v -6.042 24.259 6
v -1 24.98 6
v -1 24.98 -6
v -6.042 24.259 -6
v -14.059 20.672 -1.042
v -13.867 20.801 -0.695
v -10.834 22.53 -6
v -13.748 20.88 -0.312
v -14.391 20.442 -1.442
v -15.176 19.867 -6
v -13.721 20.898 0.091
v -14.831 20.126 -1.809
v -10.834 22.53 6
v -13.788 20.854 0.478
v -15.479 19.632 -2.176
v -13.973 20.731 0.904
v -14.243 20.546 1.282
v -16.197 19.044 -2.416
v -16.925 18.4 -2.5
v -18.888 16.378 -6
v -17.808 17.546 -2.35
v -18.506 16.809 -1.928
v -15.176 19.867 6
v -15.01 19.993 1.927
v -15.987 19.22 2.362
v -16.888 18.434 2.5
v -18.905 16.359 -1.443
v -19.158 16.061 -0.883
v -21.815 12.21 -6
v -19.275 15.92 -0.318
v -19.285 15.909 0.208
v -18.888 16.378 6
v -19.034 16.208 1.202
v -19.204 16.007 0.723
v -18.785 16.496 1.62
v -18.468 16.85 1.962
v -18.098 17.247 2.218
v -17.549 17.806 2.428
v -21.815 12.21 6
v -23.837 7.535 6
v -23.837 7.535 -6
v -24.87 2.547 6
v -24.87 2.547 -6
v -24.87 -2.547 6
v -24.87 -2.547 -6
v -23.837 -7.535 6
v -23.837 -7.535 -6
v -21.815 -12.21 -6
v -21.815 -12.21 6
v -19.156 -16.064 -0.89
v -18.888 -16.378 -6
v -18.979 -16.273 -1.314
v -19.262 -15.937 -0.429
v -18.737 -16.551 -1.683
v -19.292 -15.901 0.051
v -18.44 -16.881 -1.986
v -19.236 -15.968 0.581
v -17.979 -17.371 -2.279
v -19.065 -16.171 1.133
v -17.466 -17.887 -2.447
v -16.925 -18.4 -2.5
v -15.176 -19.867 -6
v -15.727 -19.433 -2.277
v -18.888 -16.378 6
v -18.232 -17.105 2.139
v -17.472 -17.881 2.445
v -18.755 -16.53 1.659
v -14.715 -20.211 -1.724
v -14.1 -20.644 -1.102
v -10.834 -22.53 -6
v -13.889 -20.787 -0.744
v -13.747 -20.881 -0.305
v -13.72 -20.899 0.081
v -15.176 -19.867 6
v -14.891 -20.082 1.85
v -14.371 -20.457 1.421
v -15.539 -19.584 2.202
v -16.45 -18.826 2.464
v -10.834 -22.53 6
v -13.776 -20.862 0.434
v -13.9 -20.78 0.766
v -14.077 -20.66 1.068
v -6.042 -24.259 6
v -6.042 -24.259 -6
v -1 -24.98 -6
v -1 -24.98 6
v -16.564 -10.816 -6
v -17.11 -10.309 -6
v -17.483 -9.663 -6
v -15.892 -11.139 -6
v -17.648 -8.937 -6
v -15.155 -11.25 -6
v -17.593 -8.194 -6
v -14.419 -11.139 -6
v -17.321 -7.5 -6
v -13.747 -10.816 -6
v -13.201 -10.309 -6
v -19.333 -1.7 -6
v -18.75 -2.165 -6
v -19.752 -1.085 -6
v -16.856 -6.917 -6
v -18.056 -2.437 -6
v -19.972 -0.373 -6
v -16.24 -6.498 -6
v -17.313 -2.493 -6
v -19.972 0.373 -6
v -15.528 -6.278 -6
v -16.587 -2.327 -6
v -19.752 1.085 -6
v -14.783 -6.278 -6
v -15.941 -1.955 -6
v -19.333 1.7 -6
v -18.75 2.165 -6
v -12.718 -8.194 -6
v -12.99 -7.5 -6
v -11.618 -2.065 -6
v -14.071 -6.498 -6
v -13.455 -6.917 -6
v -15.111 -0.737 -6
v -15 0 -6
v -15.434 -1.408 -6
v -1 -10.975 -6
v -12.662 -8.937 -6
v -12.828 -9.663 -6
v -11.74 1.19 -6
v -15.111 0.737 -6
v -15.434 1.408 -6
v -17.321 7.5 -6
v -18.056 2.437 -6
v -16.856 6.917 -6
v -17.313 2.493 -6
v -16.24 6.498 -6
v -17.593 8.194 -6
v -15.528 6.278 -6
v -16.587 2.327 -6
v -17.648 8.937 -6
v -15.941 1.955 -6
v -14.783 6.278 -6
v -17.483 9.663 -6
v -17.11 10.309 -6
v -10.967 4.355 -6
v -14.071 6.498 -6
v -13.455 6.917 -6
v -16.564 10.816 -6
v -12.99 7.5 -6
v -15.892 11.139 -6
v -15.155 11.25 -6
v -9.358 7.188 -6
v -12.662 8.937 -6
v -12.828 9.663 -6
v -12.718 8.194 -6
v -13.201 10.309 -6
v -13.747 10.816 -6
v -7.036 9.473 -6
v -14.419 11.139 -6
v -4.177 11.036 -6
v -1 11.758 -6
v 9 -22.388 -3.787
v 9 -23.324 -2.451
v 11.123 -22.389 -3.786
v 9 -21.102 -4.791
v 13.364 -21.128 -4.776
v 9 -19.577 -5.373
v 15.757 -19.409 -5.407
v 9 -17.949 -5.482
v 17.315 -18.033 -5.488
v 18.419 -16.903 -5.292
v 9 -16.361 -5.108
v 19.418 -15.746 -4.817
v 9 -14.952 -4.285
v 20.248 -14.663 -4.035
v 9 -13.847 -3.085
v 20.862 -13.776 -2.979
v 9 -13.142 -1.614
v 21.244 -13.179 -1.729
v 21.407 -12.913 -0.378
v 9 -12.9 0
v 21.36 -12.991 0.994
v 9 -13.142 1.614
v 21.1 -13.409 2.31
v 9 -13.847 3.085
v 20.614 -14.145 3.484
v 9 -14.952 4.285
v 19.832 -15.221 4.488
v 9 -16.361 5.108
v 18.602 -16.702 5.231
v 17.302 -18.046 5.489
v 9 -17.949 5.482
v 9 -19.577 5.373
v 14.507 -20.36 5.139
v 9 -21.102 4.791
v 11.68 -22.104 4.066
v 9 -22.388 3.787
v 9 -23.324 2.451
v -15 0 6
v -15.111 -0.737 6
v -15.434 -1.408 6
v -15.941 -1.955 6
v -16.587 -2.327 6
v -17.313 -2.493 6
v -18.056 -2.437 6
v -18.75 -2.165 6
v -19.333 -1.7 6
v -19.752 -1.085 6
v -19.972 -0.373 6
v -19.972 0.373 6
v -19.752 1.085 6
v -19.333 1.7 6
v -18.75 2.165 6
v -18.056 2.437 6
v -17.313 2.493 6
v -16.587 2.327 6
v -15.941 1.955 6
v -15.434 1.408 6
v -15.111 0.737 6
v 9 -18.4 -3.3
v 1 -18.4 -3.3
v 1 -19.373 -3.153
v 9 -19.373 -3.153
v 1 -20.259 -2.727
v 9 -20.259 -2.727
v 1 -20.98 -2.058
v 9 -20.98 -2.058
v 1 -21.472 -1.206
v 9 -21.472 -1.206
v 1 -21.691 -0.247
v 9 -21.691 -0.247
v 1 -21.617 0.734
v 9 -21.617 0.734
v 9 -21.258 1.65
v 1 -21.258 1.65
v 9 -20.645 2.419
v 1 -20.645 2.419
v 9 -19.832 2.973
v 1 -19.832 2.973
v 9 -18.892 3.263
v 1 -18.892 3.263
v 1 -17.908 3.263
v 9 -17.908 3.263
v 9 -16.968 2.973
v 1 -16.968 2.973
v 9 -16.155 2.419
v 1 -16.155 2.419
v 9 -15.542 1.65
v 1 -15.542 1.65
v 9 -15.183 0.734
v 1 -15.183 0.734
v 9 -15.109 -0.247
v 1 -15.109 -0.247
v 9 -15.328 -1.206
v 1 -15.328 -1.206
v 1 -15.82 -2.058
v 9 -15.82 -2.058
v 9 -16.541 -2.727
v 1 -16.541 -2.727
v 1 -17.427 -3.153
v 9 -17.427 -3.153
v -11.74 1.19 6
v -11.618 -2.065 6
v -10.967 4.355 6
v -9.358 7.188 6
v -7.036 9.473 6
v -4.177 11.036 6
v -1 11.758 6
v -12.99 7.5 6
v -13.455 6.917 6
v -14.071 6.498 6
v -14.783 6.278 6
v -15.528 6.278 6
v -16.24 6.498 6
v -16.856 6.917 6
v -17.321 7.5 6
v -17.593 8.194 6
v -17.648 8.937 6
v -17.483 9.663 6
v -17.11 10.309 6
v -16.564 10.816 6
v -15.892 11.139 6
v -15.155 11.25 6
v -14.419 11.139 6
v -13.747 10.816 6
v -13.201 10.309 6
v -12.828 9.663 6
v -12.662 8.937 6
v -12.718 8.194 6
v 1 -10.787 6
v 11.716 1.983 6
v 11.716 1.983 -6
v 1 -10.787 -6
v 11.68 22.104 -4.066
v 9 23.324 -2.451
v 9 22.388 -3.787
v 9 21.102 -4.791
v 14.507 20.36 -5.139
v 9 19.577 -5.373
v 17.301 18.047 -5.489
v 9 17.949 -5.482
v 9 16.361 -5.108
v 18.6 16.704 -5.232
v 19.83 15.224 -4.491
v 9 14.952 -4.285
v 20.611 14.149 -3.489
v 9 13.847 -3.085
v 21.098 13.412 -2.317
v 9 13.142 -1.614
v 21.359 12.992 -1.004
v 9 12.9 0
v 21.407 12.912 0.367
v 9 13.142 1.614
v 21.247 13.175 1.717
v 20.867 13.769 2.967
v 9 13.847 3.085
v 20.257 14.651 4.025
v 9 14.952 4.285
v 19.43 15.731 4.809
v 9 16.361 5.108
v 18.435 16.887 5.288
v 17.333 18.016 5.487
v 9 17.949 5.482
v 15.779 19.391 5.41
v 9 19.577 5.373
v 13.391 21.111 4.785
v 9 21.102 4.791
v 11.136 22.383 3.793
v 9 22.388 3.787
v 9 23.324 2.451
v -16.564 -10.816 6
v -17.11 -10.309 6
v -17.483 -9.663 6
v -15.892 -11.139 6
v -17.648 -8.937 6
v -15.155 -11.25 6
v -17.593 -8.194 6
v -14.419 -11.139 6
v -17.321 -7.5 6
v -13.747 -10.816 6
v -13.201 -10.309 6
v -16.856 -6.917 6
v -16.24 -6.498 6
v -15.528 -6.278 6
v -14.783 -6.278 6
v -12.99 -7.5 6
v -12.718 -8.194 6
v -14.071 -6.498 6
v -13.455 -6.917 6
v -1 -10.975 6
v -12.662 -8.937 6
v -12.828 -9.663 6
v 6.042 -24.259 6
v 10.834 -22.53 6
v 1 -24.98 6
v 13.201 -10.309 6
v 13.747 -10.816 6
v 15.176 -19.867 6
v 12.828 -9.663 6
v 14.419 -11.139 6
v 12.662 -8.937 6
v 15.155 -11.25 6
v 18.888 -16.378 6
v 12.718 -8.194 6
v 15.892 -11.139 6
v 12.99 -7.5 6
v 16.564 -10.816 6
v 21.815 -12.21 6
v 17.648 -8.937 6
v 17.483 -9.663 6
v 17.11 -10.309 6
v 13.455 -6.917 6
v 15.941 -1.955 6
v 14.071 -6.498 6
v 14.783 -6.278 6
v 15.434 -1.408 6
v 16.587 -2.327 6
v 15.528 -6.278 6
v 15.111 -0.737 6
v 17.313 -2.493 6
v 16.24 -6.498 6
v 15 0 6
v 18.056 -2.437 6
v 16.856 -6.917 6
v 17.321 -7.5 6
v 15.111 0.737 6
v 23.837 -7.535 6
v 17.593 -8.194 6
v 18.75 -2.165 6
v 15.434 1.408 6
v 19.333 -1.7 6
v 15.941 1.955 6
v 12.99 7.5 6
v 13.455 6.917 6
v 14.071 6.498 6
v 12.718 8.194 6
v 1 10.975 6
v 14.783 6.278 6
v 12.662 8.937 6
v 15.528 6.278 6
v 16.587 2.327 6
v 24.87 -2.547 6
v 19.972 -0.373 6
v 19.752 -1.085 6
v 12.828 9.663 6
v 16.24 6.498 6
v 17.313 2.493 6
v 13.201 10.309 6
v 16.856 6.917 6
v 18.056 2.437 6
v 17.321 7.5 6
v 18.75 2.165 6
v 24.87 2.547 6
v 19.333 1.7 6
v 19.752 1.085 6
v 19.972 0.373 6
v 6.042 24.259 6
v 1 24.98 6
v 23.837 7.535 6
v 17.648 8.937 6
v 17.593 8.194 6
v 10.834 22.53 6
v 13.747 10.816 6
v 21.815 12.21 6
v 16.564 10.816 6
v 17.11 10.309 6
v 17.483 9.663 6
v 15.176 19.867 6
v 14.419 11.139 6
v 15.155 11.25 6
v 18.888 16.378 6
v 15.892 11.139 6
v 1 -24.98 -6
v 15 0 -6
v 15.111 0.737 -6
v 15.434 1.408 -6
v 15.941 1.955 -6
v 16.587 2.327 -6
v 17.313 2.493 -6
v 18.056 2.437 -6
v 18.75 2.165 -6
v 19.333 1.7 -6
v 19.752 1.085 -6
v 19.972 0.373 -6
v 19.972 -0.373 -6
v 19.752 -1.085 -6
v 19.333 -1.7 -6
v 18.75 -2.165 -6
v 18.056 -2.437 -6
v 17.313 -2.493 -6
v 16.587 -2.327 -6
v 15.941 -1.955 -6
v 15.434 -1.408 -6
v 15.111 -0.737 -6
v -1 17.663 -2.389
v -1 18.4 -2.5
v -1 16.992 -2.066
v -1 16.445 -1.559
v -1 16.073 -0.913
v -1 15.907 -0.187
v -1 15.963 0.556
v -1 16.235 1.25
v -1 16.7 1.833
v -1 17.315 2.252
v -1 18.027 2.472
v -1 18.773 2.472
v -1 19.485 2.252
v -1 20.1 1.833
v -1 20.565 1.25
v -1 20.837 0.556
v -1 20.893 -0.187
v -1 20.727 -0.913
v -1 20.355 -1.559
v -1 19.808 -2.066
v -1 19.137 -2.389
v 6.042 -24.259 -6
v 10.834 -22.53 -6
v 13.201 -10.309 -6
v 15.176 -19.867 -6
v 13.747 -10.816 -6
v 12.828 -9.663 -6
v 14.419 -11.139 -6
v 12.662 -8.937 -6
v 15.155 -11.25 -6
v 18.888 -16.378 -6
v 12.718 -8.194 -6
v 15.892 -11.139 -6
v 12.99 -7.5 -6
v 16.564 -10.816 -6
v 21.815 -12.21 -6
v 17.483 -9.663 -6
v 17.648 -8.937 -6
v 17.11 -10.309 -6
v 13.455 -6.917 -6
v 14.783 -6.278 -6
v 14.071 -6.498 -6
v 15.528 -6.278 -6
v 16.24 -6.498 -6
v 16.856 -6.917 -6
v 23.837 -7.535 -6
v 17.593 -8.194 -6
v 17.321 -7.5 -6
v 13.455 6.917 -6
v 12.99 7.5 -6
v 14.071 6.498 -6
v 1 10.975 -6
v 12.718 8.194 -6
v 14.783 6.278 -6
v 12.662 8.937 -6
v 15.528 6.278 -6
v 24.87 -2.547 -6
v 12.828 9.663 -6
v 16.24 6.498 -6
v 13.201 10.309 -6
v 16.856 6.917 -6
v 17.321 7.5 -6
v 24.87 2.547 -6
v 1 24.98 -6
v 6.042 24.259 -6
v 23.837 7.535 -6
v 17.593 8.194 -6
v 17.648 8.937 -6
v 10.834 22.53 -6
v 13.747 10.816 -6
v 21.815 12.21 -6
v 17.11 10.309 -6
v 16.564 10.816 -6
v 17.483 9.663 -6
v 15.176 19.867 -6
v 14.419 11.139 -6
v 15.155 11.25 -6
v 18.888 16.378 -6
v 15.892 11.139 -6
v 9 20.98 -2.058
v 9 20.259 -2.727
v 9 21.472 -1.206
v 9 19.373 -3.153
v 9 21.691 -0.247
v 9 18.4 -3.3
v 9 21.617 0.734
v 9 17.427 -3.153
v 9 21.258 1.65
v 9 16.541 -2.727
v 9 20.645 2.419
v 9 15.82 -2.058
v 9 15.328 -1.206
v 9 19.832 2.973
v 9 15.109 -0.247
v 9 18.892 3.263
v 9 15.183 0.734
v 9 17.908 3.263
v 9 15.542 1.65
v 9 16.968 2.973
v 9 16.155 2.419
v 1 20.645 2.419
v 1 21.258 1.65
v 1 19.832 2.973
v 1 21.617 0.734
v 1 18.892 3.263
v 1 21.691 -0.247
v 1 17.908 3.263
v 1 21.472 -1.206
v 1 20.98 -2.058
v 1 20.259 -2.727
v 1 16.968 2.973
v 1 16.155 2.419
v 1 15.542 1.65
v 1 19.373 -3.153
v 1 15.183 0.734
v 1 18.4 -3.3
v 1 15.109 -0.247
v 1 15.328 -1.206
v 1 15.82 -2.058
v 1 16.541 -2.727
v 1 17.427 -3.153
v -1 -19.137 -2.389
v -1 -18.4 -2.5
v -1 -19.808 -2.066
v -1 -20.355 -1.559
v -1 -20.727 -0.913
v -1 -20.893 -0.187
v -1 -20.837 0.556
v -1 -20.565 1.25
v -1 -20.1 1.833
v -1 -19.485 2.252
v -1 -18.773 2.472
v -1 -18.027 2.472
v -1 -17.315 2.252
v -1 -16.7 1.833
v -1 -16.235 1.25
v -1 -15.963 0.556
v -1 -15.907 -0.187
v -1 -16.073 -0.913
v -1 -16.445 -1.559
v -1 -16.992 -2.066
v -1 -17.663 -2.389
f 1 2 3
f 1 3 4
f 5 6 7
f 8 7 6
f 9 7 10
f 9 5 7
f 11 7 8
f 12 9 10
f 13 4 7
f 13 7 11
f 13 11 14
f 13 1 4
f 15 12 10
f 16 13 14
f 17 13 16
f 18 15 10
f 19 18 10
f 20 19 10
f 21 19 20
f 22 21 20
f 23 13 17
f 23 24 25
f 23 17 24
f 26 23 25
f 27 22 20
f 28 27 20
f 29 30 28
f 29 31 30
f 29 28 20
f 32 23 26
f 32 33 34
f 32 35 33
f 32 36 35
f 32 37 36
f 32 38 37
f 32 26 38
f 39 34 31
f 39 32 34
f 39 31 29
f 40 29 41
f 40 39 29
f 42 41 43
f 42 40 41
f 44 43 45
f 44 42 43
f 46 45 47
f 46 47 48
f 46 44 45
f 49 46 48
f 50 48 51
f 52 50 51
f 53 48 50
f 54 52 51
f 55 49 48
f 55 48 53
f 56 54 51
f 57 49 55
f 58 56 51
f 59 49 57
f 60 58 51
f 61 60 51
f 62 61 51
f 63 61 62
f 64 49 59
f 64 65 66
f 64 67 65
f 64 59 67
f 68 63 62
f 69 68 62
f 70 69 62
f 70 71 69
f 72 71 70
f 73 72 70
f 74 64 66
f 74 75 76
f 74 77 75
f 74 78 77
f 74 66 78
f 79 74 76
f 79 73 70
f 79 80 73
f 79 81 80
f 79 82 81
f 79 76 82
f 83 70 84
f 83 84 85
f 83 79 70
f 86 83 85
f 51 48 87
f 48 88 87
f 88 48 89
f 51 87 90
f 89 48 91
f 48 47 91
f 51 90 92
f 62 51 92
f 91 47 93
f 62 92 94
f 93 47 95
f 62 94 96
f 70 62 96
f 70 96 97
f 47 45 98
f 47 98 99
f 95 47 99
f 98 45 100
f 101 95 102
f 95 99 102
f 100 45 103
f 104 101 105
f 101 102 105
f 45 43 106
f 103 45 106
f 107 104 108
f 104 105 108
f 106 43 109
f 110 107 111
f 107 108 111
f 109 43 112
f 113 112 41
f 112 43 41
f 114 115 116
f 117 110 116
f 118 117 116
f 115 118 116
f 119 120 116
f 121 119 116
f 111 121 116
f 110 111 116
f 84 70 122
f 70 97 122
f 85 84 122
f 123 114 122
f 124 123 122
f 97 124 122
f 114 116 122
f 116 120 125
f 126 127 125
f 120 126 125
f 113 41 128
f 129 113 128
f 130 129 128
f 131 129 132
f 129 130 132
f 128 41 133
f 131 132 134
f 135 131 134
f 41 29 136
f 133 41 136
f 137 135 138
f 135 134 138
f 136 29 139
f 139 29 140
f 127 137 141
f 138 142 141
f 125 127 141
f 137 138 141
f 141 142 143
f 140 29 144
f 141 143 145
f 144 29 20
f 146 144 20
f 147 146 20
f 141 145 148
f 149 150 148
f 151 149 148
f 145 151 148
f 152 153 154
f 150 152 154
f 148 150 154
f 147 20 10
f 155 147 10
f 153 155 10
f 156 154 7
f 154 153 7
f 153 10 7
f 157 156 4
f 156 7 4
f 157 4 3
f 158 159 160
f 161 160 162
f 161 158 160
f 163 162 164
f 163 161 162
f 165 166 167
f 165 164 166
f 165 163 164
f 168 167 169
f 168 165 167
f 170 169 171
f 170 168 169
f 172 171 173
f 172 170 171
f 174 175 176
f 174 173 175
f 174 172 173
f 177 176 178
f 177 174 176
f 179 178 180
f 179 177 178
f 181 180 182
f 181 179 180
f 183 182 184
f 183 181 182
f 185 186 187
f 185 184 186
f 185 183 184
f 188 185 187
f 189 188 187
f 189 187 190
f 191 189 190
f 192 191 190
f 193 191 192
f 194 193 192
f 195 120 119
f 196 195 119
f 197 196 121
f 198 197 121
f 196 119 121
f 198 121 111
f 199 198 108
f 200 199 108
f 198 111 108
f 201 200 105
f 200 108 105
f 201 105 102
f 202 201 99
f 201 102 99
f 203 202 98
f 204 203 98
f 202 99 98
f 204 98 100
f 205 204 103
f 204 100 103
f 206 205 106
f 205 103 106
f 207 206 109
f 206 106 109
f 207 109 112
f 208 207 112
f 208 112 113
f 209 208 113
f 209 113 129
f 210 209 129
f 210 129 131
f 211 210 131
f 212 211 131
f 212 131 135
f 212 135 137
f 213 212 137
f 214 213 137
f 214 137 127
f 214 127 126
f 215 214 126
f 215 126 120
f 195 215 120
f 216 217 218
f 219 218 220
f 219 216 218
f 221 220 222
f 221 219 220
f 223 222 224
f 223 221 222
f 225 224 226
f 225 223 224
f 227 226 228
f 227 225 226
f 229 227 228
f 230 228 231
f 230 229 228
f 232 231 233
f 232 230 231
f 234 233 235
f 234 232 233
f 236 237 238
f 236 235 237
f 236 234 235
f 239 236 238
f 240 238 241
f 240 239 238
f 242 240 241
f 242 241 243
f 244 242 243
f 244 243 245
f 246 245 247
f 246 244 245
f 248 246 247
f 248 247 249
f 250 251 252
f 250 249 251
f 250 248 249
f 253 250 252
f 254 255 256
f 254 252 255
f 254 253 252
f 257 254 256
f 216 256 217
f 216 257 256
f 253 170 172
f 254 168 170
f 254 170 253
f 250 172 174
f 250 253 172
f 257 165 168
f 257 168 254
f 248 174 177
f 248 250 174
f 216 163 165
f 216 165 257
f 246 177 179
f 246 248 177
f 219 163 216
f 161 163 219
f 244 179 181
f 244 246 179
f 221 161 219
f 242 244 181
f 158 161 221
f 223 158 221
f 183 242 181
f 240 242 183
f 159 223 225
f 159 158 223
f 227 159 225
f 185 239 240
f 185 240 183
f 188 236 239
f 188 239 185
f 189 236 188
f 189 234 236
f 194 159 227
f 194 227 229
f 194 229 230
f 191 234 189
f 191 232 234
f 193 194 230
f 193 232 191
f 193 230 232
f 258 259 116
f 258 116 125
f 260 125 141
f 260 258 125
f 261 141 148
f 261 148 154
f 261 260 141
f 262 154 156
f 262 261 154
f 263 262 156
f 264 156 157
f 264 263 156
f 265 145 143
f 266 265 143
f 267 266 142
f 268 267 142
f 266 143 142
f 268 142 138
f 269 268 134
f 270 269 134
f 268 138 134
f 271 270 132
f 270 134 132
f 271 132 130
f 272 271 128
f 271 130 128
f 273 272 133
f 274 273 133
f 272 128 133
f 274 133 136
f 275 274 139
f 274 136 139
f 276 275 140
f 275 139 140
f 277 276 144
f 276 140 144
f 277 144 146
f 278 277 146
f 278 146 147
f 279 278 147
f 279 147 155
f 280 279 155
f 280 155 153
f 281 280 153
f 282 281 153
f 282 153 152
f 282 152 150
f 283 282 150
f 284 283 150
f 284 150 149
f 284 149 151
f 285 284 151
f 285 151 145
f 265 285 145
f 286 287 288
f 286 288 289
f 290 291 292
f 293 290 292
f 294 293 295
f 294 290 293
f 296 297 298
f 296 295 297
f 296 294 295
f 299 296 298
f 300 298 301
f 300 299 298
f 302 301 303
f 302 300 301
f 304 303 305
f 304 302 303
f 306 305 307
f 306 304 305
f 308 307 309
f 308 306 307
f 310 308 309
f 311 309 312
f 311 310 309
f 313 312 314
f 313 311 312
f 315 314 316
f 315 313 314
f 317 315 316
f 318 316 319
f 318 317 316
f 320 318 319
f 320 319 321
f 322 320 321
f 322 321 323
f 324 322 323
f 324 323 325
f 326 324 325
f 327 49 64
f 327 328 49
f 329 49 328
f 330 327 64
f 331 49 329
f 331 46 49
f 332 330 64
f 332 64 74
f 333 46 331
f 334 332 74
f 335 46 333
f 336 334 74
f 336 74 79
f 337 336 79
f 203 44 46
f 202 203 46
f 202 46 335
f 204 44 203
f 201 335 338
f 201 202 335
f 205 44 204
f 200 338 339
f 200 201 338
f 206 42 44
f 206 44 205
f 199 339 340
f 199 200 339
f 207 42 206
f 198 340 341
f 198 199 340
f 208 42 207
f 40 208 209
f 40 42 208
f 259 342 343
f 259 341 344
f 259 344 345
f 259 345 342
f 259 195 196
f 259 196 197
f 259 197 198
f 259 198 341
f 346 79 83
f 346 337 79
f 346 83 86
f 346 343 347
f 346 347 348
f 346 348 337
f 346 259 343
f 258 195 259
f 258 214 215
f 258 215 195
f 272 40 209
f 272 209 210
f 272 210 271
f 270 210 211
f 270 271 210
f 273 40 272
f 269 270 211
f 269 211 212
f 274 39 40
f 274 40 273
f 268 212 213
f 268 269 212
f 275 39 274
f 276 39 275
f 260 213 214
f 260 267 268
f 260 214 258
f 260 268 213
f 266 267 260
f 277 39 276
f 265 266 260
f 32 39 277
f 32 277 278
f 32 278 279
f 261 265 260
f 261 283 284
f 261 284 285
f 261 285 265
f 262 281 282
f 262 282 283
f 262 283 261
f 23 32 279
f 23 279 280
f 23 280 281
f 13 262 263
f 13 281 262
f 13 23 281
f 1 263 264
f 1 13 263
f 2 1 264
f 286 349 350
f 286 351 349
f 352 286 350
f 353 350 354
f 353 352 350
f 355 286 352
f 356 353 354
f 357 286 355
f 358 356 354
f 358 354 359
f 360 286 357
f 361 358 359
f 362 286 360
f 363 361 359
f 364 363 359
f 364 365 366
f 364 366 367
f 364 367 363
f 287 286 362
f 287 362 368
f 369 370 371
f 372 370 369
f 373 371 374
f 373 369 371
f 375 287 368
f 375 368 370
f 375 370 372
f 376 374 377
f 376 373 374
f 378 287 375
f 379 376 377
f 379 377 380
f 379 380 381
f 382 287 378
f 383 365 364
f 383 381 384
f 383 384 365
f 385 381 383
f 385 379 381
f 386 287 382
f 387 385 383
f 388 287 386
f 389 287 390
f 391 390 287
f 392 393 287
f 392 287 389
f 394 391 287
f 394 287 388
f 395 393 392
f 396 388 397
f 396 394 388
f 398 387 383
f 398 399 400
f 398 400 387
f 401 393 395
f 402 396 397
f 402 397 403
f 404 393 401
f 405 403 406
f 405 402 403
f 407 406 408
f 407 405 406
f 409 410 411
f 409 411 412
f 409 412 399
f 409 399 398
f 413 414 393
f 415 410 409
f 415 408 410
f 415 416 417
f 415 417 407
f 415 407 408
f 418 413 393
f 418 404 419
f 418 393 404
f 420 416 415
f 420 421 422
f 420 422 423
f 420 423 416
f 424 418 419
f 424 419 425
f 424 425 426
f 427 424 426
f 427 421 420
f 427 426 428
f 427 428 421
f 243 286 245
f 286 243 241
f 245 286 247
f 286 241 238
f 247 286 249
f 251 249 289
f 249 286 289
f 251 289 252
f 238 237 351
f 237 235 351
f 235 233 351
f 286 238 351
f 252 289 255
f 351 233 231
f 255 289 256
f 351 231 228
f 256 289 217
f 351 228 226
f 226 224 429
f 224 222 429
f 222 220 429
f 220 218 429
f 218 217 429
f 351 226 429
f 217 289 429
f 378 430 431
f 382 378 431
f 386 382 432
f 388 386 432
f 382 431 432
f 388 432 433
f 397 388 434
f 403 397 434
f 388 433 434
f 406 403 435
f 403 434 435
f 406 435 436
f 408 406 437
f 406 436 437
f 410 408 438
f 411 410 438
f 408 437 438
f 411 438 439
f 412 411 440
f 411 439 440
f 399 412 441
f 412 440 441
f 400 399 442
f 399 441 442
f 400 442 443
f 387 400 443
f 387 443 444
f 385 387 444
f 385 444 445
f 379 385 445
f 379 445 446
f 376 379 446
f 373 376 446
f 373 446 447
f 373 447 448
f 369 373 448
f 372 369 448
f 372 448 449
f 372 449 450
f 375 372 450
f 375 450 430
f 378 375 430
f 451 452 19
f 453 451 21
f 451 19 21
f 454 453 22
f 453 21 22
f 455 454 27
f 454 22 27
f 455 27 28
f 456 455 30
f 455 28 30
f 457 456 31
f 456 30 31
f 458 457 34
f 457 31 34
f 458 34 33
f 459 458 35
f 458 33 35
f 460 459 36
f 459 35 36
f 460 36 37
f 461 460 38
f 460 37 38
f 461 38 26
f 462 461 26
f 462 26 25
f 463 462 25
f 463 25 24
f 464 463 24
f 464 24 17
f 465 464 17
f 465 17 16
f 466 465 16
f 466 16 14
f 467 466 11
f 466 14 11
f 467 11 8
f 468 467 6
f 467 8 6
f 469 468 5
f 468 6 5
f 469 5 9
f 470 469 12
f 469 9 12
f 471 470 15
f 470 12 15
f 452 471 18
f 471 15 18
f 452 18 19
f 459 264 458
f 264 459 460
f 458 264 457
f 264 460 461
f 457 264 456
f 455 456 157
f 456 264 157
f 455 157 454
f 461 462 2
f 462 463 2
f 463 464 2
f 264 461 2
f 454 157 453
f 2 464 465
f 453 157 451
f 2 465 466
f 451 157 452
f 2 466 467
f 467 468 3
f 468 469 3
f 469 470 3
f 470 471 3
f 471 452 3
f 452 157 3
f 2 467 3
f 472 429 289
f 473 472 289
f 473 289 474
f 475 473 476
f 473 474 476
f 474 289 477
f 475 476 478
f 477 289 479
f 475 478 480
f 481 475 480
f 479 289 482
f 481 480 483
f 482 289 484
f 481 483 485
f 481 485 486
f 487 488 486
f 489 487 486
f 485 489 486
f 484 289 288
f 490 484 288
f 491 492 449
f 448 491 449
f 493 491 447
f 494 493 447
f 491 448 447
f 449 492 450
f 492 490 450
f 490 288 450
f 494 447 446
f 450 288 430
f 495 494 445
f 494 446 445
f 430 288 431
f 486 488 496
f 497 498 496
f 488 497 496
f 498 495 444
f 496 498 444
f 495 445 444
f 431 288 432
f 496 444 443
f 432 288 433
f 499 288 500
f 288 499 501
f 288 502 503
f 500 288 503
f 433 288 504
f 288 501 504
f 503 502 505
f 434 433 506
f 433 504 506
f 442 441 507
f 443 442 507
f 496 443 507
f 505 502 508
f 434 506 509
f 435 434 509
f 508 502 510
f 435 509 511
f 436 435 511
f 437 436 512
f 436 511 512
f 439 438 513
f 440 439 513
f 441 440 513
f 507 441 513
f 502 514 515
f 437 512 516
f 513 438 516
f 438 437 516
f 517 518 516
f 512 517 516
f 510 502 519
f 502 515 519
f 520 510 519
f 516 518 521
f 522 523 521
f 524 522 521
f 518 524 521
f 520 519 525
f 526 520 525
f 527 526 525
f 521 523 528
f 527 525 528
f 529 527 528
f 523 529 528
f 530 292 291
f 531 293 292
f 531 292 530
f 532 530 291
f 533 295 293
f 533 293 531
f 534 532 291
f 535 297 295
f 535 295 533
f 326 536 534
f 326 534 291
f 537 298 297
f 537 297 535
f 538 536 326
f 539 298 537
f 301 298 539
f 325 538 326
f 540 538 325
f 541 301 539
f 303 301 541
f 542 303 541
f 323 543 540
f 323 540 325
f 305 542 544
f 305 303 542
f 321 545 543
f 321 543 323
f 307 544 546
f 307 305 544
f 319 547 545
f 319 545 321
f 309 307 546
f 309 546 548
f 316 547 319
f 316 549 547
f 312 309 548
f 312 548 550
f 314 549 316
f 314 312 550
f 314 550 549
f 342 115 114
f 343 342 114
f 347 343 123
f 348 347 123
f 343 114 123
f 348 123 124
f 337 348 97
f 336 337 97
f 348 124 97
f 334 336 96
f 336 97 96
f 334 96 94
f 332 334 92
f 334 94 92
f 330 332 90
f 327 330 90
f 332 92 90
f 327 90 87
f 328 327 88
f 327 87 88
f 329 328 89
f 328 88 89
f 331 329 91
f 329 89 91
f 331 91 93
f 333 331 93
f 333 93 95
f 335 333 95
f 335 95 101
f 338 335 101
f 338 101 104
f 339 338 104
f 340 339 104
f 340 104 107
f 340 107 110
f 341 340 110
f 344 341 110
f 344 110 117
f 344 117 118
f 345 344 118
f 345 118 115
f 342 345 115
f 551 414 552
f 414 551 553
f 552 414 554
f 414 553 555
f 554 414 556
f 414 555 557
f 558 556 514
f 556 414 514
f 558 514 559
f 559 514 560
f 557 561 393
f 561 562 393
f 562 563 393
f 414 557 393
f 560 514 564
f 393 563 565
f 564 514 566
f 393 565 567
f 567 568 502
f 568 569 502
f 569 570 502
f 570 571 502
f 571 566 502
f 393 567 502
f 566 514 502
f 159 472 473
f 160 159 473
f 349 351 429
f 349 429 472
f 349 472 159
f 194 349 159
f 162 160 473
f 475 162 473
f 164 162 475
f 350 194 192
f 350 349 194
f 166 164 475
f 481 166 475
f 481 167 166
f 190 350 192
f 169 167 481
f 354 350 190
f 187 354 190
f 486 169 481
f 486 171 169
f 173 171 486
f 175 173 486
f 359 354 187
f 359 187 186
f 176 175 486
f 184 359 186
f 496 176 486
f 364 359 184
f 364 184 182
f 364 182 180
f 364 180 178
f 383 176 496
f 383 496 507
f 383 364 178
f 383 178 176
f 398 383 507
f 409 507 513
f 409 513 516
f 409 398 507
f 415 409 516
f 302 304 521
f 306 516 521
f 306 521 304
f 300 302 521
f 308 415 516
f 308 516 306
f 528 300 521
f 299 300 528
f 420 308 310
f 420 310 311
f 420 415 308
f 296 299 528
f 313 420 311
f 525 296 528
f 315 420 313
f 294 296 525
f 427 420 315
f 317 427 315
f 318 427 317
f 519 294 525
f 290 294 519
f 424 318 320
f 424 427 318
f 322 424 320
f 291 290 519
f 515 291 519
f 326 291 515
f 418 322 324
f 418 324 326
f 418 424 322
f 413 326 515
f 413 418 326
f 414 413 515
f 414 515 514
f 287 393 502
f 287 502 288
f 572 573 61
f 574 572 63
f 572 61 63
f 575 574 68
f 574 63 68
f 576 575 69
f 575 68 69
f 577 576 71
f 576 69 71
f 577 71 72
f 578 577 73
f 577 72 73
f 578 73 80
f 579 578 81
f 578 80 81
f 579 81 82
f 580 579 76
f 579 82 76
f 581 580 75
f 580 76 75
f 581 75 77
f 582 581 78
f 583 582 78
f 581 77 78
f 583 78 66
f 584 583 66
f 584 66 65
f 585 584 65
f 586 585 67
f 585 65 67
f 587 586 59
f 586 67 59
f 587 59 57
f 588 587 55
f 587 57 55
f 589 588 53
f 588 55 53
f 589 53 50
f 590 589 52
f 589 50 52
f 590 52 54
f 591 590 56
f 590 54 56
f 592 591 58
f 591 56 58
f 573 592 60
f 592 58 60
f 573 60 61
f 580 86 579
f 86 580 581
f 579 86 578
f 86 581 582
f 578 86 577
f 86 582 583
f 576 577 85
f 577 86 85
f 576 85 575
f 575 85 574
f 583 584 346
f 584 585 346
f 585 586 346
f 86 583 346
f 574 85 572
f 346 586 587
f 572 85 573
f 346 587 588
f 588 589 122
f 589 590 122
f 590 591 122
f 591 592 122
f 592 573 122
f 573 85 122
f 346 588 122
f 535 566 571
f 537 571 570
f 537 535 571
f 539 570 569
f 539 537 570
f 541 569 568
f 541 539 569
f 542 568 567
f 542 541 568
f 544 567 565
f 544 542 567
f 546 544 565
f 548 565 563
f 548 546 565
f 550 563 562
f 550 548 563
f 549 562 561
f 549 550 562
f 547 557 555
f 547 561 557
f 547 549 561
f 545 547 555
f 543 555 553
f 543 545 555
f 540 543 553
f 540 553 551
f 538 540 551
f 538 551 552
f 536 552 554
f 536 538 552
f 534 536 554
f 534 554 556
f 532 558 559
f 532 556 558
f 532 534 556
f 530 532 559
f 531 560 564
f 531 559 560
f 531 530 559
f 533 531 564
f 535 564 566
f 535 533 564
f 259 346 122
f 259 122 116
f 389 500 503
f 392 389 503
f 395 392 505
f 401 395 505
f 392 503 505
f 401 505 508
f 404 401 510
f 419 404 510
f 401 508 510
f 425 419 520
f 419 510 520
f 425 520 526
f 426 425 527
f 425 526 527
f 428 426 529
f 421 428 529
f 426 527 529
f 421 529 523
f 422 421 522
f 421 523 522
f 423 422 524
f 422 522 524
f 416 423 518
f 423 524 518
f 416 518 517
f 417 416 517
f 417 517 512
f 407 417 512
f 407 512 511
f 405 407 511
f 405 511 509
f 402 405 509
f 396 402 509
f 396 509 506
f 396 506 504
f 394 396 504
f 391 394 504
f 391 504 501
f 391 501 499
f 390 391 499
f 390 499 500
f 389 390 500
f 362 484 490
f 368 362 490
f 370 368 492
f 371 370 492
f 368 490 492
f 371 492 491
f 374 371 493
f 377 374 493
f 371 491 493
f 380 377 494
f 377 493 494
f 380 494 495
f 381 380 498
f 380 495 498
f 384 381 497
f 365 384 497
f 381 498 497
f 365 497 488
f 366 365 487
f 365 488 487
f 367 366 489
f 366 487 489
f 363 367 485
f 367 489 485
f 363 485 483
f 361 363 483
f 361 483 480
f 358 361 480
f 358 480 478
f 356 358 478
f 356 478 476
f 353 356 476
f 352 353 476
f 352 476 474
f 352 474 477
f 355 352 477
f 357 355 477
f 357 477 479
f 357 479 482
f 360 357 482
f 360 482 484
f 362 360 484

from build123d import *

# Parameters (mm, degrees)
SKETCH_7_R                  = 25
EXTRUDE_1_DEPTH             = 6
M6X1_0_1_D                  = 5
PATTERN_CIRCULAR_2_COUNT    = 12
CUT_EXTRUDE_1_DEPTH         = 36.860842154
CUT_EXTRUDE_1_DEPTH_BACK    = 36.860842154
HOLE_WIZARD_M6_1_AT_2_COUNT = 2
HOLE_WIZARD_M6_1_AT_2_PITCH = 36.8
SKETCH_29_W                 = 2.5
SKETCH_29_H                 = 40
M6X1_0_3_AT_2_COUNT         = 2
M6X1_0_3_AT_2_PITCH         = 36.8
SKETCH_30_R                 = 5.5
CUT_EXTRUDE_2_DEPTH         = 48.539457445


with BuildPart() as part:
    # 스케치7 → 보스-돌출1 (new, symmetric)
    with BuildSketch(Plane.XY):
        Circle(SKETCH_7_R)
        with BuildLine():
            Line((11.71577008, 1.983237616), (0.081314344, -11.882166805))
            Line((0.081314344, -11.882166805), (-11.617833542, -2.065416128))
            ThreePointArc((-11.617833542, -2.065416128), (-9.039324429, 7.584893794), (0.016622193, 11.799988292))
            Line((0.016622193, 11.799988292), (11.71577008, 1.983237616))
        make_face(mode=Mode.SUBTRACT)
    extrude(amount=EXTRUDE_1_DEPTH, both=True)

    # M6x1.0 나사 구멍1 (through all)
    with Locations(Plane.XY.offset(6)):
        with Locations((17.5, 0)):
            m6x1_0_1 = Hole(M6X1_0_1_D / 2)

    # 원형 패턴2: M6x1.0 나사 구멍1 ×12 about axis, 6 skipped
    pattern_circular_2_axis = Axis((0, 0, 0), (0, 0, -1))
    add([m6x1_0_1.rotate(pattern_circular_2_axis, i * 360 / PATTERN_CIRCULAR_2_COUNT) for i in range(1, PATTERN_CIRCULAR_2_COUNT) if i not in (2, 3, 4, 8, 9, 10)], mode=Mode.SUBTRACT)

    # 스케치19 → 컷-돌출1 (cut, two sides: drawn at the far end of the back side and taken through both)
    with BuildSketch(Plane.XY.offset(-CUT_EXTRUDE_1_DEPTH_BACK)):
        with BuildLine():
            Line((1, 24.979991994), (1, -24.979991994))
            ThreePointArc((1, -24.979991994), (0, -25), (-1, -24.979991994))
            Line((-1, -24.979991994), (-1, 24.979991994))
            ThreePointArc((-1, 24.979991994), (0, 25), (1, 24.979991994))
        make_face()
    extrude(amount=CUT_EXTRUDE_1_DEPTH + CUT_EXTRUDE_1_DEPTH_BACK, mode=Mode.SUBTRACT)


with BuildPart() as cut_extrude_1_piece_1:
    # of the separate pieces the step leaves, piece 1, a body of its own (cut_extrude_1_pieces)
    add(part.part.solids().sort_by_distance((1, 24.979991994, 6))[0])

    # 스케치23 → M6 소켓 머리 캡 나사용 카운터보어1 (revolve, cut)
    with BuildSketch(Plane(origin=(15, 18.4, 0), x_dir=(0, 0, -1), z_dir=(0, 1, 0))):
        Polygon((0, 0), (0, 40), (3.3, 40), (3.3, 6), (5.5, 6), (5.5, 0), align=None)
    hole_wizard_m6_1 = revolve(axis=Axis((21.35, 18.4, 0), (-1, 0, 0)), mode=Mode.SUBTRACT)

    # M6 소켓 머리 캡 나사용 카운터보어1 at 2: M6 소켓 머리 캡 나사용 카운터보어1 ×2
    with Locations(*[(0, -i * HOLE_WIZARD_M6_1_AT_2_PITCH, 0) for i in range(1, HOLE_WIZARD_M6_1_AT_2_COUNT)]):
        add(hole_wizard_m6_1, mode=Mode.SUBTRACT)

    # 스케치30 → 컷-돌출2 (cut, through all)
    with BuildSketch(Plane(origin=(15, 0, 0), x_dir=(0, 0, -1), z_dir=(1, 0, 0))):
        with Locations((0, 18.4)):
            Circle(SKETCH_30_R)
        with Locations((0, -18.4)):
            Circle(SKETCH_30_R)
    extrude(amount=CUT_EXTRUDE_2_DEPTH, mode=Mode.SUBTRACT)


with BuildPart() as cut_extrude_1_piece_2:
    # of the separate pieces the step leaves, piece 2, a body of its own (cut_extrude_1_pieces)
    add(part.part.solids().sort_by_distance((-1, 24.979991994, -6))[0])

    # 스케치29 → M6x1.0 나사 구멍3 (revolve, cut)
    with BuildSketch(Plane(origin=(15, 18.4, 0), x_dir=(0, 0, -1), z_dir=(0, 1, 0))):
        with Locations((1.25, 20)):
            Rectangle(SKETCH_29_W, SKETCH_29_H)
    m6x1_0_3 = revolve(axis=Axis((21.35, 18.4, 0), (-1, 0, 0)), mode=Mode.SUBTRACT)

    # M6x1.0 나사 구멍3 at 2: M6x1.0 나사 구멍3 ×2
    with Locations(*[(0, -i * M6X1_0_3_AT_2_PITCH, 0) for i in range(1, M6X1_0_3_AT_2_COUNT)]):
        add(m6x1_0_3, mode=Mode.SUBTRACT)


solid = Compound([cut_extrude_1_piece_1.part, cut_extrude_1_piece_2.part])
